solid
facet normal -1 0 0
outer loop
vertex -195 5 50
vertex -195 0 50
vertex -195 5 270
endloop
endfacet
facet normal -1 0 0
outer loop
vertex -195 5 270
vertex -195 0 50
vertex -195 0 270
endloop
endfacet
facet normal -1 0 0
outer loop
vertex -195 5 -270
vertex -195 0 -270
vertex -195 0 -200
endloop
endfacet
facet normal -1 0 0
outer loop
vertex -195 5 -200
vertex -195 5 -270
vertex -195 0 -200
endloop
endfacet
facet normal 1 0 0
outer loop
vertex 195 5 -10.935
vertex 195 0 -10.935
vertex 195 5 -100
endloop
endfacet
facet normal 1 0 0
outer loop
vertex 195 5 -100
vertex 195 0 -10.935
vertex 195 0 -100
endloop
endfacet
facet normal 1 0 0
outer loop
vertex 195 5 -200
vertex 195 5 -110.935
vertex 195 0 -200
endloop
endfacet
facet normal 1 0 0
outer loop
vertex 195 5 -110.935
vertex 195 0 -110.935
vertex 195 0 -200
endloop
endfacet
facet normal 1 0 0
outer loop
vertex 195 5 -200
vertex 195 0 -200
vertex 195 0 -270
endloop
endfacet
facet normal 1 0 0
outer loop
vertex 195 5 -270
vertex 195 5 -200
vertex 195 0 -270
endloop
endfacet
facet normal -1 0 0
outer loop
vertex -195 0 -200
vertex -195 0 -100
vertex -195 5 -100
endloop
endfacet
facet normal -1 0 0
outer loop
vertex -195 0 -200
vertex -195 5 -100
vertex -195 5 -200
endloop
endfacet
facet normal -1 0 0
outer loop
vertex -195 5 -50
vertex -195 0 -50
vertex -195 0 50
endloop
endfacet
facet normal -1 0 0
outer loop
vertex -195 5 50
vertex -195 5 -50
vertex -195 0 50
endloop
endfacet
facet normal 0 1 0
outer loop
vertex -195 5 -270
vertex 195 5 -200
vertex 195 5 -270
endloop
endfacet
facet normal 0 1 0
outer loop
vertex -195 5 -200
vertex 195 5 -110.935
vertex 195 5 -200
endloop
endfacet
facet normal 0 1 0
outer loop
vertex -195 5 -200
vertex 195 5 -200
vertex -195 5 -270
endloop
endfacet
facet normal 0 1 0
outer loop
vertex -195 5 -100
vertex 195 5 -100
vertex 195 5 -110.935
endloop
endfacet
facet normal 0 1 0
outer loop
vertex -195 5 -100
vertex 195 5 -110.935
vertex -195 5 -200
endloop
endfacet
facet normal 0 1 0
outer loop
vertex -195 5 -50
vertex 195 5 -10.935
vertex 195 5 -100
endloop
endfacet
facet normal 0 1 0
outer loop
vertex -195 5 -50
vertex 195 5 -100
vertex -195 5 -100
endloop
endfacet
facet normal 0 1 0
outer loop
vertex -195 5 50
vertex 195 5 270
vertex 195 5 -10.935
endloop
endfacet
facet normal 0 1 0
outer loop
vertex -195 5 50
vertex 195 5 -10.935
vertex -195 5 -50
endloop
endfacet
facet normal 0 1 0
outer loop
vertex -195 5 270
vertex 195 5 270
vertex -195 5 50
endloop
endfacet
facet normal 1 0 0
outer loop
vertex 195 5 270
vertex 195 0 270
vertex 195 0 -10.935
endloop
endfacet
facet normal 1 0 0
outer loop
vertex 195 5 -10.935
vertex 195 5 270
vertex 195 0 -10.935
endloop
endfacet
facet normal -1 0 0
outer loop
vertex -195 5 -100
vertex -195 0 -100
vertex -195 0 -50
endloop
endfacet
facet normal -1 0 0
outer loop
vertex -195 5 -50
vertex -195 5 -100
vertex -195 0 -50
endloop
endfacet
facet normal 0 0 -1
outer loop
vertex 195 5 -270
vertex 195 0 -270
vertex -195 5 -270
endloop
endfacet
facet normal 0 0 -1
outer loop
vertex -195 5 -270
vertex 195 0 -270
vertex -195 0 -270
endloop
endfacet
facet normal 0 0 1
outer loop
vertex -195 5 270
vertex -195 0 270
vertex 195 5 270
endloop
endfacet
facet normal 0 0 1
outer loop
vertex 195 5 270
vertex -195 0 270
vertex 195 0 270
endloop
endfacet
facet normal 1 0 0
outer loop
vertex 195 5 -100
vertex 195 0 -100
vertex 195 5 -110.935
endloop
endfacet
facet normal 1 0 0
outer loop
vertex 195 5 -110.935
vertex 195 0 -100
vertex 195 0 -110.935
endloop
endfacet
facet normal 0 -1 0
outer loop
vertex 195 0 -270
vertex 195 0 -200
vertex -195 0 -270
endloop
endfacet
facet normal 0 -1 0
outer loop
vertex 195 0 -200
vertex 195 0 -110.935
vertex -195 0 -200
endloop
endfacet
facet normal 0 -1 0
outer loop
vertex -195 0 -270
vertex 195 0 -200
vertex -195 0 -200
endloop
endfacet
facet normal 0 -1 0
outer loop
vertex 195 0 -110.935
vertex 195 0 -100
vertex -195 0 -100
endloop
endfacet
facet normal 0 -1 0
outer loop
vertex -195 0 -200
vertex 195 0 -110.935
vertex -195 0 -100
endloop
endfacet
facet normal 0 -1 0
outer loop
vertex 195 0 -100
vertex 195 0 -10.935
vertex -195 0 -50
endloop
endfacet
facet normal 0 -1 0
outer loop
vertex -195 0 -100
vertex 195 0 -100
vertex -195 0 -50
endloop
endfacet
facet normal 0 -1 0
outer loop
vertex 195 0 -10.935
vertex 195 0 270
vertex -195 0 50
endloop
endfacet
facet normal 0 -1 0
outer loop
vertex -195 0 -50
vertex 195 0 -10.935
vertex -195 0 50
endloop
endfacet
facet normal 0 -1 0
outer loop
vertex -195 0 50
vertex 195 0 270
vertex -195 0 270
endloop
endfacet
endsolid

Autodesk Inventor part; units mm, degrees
ref_plane "YZ Plane" through (0, 0, 0) normal (1, 0, 0) x (0, 1, 0)
ref_plane "XZ Plane" through (0, 0, 0) normal (0, 1, 0) x (-1, 0, 0)
ref_plane "XY Plane" through (0, 0, 0) normal (0, 0, 1) x (1, 0, 0)
sketch "Sketch1" plane through (0, 0, 0) normal (0, 1, 0) x (-1, 0, 0)
  line L0 (195, 270) -> (-195, 270)
  line L1 (-195, 270) -> (-195, -270)
  line L2 (-195, -270) -> (195, -270)
  line L3 (195, -270) -> (195, 270)
  line L4 (195, 270) -> (-195, -270) construction
  line L5 (-195, 270) -> (195, -270) construction
  line L6 (-195, -10.9351) -> (-195, -110.9351)
  line L7 (195, -50) -> (195, 50)
  line L8 (-195, -200) -> (-195, -100)
  line L9 (195, -100) -> (195, -200)
  point P0 (0, 0)
  dimension "d0" = 390
  dimension "d1" = 540
extrude "Extrusion1" add sketch "Sketch1" along normal blind 5
properties part number "Bottom_Plate_Acryl" material "Acetal Resin, Black"
